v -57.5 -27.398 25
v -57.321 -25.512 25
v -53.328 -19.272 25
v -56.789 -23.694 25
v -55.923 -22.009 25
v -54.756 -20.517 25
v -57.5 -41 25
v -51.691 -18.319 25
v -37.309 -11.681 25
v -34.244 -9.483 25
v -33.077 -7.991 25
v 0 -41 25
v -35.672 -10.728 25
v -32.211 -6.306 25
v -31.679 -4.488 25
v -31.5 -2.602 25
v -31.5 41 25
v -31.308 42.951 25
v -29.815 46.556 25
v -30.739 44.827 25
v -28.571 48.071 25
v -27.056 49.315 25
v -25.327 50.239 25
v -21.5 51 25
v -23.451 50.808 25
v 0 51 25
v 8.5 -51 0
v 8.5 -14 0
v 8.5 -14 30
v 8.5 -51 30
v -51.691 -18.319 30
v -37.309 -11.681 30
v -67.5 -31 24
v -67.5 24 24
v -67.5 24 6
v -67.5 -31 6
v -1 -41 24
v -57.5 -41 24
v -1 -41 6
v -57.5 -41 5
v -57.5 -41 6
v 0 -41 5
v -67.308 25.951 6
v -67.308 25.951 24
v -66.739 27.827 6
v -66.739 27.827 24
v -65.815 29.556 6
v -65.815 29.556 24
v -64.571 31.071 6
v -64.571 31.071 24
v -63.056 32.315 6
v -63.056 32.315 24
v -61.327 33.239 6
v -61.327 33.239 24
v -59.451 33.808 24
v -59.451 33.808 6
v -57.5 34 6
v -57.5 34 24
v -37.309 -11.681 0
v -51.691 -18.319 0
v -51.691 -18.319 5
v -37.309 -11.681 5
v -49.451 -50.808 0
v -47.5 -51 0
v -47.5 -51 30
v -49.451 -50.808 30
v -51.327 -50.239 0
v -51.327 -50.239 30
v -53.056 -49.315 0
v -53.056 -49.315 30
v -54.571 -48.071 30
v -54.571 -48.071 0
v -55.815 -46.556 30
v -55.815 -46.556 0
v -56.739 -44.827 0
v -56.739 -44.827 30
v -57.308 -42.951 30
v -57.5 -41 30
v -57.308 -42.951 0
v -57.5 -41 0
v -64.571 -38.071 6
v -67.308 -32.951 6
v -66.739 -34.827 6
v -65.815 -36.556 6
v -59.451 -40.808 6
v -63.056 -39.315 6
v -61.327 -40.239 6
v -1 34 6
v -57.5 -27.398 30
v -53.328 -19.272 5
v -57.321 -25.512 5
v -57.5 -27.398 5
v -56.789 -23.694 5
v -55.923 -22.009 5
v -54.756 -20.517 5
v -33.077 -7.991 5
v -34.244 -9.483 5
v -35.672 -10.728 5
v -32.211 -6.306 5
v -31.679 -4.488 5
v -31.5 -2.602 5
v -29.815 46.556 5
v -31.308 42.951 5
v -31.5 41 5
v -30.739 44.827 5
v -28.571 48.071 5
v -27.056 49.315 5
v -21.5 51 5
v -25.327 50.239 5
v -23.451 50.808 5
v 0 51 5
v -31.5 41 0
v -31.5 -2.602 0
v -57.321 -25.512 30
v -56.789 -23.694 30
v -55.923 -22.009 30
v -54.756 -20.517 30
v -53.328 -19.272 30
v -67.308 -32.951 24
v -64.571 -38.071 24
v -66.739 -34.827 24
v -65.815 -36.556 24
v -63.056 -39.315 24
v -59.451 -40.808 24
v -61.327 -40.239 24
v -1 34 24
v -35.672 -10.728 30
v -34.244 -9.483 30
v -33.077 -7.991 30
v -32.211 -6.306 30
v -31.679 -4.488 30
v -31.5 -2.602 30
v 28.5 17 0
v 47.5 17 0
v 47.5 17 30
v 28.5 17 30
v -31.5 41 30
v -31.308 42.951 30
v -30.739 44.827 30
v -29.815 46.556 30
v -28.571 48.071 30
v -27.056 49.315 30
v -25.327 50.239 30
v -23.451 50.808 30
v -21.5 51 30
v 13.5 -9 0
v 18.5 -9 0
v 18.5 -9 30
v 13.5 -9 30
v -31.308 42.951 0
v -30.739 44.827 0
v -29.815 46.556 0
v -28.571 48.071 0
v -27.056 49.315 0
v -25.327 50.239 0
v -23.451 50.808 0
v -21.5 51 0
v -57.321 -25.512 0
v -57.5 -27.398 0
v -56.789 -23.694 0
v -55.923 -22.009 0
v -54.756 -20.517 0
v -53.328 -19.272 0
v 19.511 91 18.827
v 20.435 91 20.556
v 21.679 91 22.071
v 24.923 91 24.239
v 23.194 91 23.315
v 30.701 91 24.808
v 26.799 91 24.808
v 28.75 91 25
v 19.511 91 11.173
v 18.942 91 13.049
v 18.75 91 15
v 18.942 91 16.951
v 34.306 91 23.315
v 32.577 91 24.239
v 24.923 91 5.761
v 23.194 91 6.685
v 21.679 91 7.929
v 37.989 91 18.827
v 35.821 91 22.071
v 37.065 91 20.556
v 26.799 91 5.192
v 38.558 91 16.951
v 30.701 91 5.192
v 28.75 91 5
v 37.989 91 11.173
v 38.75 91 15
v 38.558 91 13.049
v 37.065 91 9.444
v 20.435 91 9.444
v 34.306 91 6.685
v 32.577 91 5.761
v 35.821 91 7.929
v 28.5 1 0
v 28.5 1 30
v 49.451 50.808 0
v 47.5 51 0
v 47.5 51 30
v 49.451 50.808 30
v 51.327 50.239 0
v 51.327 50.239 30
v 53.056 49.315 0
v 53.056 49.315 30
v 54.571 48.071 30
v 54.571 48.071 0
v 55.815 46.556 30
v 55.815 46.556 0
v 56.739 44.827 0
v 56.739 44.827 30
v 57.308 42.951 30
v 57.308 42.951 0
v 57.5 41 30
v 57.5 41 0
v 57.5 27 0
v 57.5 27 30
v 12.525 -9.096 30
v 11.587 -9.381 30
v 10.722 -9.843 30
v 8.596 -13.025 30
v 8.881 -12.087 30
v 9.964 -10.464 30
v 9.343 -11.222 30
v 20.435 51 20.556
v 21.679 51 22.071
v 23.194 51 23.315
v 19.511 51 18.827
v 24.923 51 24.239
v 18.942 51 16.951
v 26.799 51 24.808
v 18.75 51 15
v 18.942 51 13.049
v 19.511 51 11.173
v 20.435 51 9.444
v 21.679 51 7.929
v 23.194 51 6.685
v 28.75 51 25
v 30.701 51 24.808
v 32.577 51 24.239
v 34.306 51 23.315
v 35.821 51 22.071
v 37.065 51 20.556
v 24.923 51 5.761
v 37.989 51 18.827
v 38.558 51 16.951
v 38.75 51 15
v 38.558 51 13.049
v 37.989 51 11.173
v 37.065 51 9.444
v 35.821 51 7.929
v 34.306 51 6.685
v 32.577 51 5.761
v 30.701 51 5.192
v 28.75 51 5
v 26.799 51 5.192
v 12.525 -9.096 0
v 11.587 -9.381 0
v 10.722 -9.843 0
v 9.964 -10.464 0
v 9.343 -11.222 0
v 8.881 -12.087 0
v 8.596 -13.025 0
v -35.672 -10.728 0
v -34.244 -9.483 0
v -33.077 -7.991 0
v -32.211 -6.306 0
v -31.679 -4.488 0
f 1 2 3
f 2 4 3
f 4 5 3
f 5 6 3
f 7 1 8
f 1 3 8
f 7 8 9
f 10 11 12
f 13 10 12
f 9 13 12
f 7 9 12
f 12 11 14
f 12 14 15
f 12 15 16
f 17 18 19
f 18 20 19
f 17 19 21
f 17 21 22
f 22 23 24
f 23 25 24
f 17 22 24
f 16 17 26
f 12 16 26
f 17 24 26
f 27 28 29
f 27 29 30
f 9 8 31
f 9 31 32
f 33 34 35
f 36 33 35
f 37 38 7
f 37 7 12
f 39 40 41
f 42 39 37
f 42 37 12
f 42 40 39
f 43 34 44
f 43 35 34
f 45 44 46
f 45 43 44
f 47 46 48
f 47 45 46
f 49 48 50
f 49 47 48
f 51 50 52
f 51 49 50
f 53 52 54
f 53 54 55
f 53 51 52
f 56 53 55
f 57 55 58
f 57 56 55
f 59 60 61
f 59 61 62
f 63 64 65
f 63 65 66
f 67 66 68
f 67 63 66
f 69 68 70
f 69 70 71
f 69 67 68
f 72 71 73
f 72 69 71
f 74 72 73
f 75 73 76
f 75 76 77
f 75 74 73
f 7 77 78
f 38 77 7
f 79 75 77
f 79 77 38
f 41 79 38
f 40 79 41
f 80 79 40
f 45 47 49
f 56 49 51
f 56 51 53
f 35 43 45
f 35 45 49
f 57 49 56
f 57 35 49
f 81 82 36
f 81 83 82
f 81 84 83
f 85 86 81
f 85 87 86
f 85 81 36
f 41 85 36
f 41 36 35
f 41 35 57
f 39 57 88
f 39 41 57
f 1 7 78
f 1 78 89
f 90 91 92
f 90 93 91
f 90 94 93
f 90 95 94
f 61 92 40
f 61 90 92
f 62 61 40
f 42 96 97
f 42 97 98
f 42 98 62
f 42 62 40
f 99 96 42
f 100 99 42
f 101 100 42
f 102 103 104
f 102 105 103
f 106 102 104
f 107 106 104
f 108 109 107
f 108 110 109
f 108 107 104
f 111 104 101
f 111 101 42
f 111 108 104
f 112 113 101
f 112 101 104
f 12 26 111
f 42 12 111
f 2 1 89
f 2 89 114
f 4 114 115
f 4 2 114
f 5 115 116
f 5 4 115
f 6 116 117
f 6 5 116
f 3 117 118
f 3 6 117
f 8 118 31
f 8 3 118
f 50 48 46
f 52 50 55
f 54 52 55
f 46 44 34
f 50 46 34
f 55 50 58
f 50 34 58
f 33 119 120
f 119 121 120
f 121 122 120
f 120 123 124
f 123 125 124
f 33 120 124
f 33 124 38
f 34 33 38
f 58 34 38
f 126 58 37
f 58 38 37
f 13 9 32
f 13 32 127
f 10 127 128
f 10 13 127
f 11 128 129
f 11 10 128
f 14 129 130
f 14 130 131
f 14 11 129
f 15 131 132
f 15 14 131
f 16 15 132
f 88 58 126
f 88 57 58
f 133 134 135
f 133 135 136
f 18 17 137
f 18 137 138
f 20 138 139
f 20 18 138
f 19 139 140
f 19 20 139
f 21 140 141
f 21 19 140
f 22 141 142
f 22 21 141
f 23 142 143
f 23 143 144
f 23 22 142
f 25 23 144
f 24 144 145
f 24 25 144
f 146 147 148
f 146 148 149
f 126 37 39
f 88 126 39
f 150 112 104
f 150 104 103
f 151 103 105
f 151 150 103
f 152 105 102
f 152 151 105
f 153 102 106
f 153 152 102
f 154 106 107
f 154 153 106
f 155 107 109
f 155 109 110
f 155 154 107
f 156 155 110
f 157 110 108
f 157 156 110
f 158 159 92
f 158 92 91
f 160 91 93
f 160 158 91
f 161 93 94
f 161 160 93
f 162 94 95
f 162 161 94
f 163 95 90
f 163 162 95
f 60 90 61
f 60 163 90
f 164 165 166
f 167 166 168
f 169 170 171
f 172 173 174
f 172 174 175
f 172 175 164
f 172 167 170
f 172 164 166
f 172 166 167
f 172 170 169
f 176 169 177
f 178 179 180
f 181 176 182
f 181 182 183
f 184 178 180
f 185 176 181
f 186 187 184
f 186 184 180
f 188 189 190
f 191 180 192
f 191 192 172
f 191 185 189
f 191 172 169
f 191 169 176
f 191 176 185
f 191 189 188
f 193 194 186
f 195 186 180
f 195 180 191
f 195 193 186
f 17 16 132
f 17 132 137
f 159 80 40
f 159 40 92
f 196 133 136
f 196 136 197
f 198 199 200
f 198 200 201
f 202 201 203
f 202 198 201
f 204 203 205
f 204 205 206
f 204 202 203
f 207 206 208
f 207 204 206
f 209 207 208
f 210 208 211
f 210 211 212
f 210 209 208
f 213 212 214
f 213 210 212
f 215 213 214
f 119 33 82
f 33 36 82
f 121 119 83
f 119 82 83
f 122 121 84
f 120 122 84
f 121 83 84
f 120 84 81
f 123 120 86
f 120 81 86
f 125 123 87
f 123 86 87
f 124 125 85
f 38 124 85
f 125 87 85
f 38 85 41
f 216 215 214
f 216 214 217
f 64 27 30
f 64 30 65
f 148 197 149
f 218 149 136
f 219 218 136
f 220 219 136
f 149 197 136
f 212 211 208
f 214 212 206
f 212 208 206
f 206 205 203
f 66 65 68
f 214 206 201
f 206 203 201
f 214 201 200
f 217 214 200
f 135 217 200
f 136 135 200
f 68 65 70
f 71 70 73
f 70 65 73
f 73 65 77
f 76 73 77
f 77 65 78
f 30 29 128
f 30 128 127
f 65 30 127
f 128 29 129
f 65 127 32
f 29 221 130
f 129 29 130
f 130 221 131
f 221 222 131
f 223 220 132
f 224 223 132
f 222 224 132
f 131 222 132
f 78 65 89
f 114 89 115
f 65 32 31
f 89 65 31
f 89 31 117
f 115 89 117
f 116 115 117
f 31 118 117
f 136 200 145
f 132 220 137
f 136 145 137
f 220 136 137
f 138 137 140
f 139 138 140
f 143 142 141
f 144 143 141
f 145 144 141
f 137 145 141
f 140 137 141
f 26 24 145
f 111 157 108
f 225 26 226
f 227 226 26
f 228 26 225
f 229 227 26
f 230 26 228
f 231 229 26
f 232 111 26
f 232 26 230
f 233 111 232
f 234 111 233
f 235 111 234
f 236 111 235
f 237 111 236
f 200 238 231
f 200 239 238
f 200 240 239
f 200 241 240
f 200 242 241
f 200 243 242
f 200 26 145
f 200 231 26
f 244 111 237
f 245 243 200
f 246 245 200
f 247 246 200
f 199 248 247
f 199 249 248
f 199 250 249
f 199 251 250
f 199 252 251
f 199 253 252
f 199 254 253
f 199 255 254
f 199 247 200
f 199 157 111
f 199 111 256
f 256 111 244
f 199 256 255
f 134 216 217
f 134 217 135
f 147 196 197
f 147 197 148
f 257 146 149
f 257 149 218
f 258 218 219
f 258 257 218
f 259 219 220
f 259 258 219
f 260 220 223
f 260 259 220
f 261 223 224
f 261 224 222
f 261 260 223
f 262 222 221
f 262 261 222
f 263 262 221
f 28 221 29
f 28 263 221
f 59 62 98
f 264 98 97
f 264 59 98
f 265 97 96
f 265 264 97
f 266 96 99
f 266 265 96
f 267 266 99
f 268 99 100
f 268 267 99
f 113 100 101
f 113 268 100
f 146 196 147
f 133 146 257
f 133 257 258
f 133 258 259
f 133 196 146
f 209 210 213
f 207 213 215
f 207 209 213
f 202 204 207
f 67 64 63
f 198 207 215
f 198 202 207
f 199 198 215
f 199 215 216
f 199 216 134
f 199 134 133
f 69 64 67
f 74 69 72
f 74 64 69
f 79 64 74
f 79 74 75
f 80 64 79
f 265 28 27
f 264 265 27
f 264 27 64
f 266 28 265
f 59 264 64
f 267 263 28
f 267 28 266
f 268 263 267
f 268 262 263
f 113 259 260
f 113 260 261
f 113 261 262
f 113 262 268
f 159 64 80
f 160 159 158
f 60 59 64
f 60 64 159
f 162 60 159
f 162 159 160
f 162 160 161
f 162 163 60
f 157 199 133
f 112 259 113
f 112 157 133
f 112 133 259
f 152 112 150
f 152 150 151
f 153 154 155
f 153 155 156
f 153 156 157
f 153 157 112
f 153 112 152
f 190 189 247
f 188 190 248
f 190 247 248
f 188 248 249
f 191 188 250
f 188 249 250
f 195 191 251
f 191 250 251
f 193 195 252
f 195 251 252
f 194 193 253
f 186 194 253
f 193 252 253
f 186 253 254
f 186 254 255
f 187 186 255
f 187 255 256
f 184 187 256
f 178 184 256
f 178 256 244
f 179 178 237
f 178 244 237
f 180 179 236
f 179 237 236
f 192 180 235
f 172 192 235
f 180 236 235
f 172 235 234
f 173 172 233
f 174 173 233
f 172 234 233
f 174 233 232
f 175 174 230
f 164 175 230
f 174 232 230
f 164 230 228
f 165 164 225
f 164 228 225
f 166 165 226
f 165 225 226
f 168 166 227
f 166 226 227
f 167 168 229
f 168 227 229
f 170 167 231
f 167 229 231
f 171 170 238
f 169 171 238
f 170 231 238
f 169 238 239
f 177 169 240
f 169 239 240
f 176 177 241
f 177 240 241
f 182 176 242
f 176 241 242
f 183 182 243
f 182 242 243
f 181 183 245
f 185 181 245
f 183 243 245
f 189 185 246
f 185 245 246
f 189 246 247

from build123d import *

# Parameters (mm, degrees)
BOSS_EXTRUDE1_DEPTH = 30
SKETCH2_W           = 61.936045122
SKETCH2_H           = 20
CUT_EXTRUDE1_DEPTH  = 92
SKETCH3_R           = 10
BOSS_EXTRUDE2_DEPTH = 40
SKETCH4_W           = 66.5
SKETCH4_H           = 18
BOSS_EXTRUDE3_DEPTH = 75
FILLET1_R           = 10
FILLET2_R           = 10


with BuildPart() as part:
    # Sketch1 → Boss-Extrude1 (new body)
    with BuildSketch(Plane.XY):
        with BuildLine():
            Line((-51.690581775, -18.31873005), (-37.309418225, -11.68126995))
            ThreePointArc((-37.309418225, -11.68126995), (-33.076645035, -7.99121144), (-31.5, -2.601676105))
            Line((-31.5, -2.601676105), (-31.5, 41))
            ThreePointArc((-31.5, 41), (-28.571067812, 48.071067812), (-21.5, 51))
            Line((-21.5, 51), (47.5, 51))
            ThreePointArc((47.5, 51), (54.571067812, 48.071067812), (57.5, 41))
            Line((57.5, 41), (57.5, 27))
            Line((57.5, 27), (47.5, 17))
            Line((47.5, 17), (28.5, 17))
            Line((28.5, 17), (28.5, 1))
            Line((28.5, 1), (18.5, -9))
            Line((18.5, -9), (13.5, -9))
            ThreePointArc((13.5, -9), (9.964466094, -10.464466094), (8.5, -14))
            Line((8.5, -14), (8.5, -51))
            Line((8.5, -51), (-47.5, -51))
            ThreePointArc((-47.5, -51), (-54.571067812, -48.071067812), (-57.5, -41))
            Line((-57.5, -41), (-57.5, -27.398323895))
            ThreePointArc((-57.5, -27.398323895), (-55.923354965, -22.00878856), (-51.690581775, -18.31873005))
        make_face()
    extrude(amount=BOSS_EXTRUDE1_DEPTH)

    # Sketch2 → Cut-Extrude1 (cut)
    with BuildSketch(Plane(origin=(0, 51, 0), x_dir=(1, 0, 0), z_dir=(0, 1, 0))):
        with Locations((-30.968022561, -15)):
            Rectangle(SKETCH2_W, SKETCH2_H)
    extrude(amount=-CUT_EXTRUDE1_DEPTH, mode=Mode.SUBTRACT)

    # Sketch3 → Boss-Extrude2 (add)
    with BuildSketch(Plane(origin=(0, 51, 0), x_dir=(1, 0, 0), z_dir=(0, 1, 0))):
        with Locations((28.75, -15)):
            Circle(SKETCH3_R)
    extrude(amount=BOSS_EXTRUDE2_DEPTH)

    # Sketch4 → Boss-Extrude3 (add)
    with BuildSketch(Plane(origin=(0, -41, 0), x_dir=(1, 0, 0), z_dir=(0, 1, 0))):
        with Locations((-34.25, -15)):
            Rectangle(SKETCH4_W, SKETCH4_H)
    extrude(amount=BOSS_EXTRUDE3_DEPTH)

    # Fillet1
    fillet1_edges = [part.edges().sort_by_distance(p)[0] for p in [
        (-67.5, -41, 15),
    ]]
    fillet(fillet1_edges, radius=FILLET1_R - 0.0001)  # a hair under: the kernel refuses the full size

    # Fillet2
    fillet2_edges = [part.edges().sort_by_distance(p)[0] for p in [
        (-67.5, 34, 15),
    ]]
    fillet(fillet2_edges, radius=FILLET2_R)


solid = part.part
